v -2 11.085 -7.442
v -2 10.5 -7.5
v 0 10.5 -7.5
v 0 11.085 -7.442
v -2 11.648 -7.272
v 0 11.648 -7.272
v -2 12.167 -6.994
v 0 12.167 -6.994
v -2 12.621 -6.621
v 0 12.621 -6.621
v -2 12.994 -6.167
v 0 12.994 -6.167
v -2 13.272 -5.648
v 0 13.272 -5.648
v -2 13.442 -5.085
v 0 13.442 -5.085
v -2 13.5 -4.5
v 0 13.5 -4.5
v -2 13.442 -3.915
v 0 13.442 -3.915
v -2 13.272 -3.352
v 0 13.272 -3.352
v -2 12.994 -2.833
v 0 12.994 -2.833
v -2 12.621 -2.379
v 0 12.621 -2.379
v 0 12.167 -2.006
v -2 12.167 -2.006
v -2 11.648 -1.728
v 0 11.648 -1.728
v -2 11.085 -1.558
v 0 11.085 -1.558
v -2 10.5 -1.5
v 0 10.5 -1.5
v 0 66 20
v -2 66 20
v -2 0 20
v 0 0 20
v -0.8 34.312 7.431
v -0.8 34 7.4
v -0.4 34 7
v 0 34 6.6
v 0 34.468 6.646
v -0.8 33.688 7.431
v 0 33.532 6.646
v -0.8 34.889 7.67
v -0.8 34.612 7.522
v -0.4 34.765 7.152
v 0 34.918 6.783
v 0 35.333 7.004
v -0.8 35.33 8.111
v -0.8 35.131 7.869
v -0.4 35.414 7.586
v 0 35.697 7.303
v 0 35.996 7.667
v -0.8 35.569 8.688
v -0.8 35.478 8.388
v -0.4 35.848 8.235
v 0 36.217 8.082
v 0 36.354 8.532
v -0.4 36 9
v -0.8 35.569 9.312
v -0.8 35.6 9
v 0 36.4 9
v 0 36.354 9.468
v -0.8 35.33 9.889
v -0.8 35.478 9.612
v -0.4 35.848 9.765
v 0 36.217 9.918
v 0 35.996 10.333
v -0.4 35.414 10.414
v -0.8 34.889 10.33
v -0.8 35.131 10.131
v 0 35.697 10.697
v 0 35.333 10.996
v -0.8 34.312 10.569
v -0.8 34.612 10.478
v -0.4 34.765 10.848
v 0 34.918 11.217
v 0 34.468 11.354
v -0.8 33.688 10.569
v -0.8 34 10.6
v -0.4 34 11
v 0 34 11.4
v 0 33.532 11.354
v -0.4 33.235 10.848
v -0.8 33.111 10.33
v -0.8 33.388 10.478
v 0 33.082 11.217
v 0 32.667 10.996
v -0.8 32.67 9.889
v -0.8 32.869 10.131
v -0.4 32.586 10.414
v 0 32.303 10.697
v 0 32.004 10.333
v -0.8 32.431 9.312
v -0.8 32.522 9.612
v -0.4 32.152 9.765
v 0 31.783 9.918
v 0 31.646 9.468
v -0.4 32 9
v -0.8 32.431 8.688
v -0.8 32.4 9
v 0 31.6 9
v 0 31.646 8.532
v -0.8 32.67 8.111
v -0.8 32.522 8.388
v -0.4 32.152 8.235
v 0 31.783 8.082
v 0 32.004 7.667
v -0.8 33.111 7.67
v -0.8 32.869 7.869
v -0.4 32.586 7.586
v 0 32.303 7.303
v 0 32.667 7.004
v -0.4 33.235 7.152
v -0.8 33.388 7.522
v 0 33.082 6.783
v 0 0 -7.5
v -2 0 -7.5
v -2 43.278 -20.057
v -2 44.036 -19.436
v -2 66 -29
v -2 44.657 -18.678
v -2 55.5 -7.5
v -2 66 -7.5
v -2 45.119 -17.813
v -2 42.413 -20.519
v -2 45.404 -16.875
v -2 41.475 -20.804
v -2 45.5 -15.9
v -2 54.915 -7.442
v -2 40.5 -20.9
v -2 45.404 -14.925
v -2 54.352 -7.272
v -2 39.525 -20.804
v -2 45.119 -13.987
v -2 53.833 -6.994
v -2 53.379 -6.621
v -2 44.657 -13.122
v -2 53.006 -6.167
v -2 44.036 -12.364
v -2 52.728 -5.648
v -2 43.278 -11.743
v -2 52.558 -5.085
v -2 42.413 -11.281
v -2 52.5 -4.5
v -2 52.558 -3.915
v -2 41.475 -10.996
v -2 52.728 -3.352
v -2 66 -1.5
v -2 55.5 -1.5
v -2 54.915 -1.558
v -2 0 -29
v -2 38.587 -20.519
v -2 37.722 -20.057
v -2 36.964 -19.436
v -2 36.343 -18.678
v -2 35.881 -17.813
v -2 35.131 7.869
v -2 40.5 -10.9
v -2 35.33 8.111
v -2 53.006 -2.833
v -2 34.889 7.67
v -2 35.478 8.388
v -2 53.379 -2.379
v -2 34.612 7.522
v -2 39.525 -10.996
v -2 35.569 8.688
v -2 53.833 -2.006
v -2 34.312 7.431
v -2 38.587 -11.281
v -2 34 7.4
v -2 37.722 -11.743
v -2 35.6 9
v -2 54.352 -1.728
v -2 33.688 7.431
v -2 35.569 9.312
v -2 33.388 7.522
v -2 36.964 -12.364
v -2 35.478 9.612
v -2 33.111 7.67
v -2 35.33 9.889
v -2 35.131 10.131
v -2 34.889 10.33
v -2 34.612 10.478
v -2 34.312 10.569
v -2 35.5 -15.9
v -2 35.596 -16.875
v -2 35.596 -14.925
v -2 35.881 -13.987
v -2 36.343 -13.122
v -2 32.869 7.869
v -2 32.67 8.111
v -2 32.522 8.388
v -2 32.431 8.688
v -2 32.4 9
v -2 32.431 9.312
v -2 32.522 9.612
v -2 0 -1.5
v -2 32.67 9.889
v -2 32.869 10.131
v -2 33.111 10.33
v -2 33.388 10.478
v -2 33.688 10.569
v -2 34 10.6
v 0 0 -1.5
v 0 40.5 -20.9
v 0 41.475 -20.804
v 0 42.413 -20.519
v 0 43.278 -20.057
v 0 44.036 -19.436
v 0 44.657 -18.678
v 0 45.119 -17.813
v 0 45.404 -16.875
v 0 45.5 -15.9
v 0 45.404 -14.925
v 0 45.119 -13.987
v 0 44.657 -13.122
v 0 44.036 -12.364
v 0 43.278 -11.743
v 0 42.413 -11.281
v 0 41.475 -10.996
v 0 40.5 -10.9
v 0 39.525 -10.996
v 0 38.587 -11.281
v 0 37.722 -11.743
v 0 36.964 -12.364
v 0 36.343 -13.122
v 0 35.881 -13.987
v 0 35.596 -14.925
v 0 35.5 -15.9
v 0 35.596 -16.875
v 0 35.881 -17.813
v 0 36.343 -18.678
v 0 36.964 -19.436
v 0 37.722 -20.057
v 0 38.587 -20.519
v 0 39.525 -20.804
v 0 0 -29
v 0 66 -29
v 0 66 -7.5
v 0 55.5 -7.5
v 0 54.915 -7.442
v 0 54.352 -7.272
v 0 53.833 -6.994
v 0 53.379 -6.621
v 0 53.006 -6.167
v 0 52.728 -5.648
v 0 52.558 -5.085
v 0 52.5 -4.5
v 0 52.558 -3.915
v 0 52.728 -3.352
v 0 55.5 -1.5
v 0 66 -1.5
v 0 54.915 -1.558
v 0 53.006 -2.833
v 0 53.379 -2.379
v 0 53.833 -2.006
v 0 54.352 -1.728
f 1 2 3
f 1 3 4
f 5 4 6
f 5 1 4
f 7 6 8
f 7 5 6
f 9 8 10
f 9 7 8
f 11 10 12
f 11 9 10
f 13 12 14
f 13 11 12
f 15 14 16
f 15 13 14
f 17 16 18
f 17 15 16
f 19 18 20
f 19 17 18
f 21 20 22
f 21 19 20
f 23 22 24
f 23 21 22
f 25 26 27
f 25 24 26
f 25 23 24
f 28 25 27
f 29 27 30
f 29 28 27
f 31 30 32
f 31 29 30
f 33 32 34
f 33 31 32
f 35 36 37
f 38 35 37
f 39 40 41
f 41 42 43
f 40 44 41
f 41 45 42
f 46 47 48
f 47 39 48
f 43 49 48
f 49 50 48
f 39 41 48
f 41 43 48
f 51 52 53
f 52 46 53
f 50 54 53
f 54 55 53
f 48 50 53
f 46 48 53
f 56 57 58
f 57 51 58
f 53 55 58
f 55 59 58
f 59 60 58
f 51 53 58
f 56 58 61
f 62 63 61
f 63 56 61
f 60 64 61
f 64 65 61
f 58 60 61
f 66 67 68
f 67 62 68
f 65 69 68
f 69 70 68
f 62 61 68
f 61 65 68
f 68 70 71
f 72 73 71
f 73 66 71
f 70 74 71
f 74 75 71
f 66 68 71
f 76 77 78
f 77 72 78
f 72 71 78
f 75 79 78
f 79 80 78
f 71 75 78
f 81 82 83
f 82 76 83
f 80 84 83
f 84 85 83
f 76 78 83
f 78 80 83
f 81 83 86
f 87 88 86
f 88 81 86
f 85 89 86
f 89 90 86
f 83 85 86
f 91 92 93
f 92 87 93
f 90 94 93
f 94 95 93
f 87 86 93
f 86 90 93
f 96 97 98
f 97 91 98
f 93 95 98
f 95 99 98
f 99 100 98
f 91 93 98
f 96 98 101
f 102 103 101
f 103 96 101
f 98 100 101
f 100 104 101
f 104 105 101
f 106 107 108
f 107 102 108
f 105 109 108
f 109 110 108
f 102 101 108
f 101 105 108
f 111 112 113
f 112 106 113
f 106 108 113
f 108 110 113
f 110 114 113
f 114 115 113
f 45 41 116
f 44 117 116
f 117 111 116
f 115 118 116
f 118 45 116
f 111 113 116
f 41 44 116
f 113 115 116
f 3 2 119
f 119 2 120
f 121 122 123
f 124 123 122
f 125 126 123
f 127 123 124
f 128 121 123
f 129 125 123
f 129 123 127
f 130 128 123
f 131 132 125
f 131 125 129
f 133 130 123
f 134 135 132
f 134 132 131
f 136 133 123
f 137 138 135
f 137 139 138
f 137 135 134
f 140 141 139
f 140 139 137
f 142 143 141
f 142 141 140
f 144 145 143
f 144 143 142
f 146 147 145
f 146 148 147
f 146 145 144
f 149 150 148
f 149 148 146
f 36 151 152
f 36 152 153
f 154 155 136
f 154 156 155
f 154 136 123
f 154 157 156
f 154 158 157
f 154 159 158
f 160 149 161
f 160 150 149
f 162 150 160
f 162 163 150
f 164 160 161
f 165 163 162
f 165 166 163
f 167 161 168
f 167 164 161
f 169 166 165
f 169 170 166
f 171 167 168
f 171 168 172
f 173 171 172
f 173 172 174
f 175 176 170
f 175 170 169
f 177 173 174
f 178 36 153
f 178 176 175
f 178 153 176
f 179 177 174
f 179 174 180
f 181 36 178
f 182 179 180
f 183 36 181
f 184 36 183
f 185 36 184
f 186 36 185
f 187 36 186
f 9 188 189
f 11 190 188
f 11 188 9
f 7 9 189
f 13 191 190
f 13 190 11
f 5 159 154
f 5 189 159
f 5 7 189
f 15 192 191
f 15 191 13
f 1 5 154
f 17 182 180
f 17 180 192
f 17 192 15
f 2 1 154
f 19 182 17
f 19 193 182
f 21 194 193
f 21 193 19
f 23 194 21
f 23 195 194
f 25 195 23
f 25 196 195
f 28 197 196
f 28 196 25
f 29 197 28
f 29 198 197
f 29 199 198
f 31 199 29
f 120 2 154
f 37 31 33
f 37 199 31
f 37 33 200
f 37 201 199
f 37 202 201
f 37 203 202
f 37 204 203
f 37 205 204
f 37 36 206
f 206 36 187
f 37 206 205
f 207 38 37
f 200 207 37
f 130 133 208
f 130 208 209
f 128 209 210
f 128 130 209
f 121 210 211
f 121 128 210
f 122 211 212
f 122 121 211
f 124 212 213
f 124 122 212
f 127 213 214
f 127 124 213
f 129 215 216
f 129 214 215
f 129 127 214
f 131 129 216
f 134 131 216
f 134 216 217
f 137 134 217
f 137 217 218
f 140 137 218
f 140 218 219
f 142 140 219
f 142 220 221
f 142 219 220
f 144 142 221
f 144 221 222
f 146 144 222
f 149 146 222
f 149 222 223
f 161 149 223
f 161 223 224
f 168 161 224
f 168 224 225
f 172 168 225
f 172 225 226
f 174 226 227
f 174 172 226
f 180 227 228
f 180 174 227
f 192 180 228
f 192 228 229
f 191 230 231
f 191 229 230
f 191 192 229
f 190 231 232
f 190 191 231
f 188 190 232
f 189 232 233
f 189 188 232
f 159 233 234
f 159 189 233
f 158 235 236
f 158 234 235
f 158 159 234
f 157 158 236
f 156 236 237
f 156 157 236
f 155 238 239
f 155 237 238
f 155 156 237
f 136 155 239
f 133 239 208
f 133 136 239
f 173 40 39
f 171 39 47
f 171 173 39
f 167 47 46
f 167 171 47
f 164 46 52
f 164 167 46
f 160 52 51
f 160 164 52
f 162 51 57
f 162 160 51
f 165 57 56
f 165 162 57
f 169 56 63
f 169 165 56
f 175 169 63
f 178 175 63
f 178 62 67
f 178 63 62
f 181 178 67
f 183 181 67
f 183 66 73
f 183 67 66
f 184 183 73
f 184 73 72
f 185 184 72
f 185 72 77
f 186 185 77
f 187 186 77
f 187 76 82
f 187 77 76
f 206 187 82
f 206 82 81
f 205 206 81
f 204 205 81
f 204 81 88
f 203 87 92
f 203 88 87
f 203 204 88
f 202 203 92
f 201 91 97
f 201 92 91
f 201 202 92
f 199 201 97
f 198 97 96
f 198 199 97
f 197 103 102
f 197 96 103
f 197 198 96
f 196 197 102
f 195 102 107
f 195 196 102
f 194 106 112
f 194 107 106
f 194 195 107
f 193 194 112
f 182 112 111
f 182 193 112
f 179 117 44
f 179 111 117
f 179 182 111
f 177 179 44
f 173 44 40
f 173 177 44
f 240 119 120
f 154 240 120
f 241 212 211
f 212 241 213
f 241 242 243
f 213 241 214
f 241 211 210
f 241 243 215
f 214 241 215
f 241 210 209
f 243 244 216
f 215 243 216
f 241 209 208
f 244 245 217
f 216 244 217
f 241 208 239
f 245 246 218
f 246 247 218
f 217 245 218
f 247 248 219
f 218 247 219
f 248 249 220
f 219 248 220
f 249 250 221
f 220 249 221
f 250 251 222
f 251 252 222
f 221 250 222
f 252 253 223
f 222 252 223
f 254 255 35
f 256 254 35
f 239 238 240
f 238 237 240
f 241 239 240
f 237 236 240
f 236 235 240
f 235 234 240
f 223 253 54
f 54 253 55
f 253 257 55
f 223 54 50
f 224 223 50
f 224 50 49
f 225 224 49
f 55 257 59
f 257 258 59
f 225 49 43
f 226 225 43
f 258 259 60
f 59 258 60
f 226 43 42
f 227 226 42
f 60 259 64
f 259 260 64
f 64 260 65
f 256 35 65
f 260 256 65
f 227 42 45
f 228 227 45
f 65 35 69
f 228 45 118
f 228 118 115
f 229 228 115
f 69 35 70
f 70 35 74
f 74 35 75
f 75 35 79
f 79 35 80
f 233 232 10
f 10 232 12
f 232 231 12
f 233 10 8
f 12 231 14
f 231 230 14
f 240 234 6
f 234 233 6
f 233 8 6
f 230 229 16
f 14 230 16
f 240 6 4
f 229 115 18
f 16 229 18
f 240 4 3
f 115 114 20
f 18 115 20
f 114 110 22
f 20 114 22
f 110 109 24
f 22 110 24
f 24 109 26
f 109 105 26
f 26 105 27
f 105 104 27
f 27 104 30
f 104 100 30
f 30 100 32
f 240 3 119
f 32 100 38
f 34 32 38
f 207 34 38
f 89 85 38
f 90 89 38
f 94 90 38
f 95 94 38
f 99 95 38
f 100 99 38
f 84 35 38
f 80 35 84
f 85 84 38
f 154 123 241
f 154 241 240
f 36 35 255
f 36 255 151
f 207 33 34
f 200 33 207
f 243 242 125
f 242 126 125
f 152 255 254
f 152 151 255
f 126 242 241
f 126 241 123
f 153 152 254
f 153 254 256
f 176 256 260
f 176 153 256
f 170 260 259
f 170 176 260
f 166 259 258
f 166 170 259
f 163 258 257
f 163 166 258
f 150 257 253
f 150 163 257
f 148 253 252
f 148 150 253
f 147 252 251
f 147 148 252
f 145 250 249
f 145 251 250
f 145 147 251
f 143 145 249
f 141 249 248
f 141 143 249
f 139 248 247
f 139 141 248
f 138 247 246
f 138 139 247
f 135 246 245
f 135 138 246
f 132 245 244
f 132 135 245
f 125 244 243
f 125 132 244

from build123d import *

# Parameters (mm, degrees)
CYLINDER003_R          = 1.6
CYLINDER003_DEPTH      = 10
FUSION_PLACEMENT_ANGLE = 90
BOX002_W               = 12
BOX002_H               = 10
BOX002_DEPTH           = 6
BOX001_W               = 12
BOX001_H               = 10
BOX001_DEPTH           = 6
CYLINDER002_R          = 3
CYLINDER002_DEPTH      = 10
CYLINDER001_R          = 5
CYLINDER001_DEPTH      = 10
CYLINDER_R             = 3
CYLINDER_DEPTH         = 10
BOX_W                  = 66
BOX_H                  = 2
BOX_DEPTH              = 49


with BuildPart() as zylinder003:
    # Cylinder003 → Cylinder003 (new body)
    with BuildSketch(Plane.XY.offset(-6)):
        Circle(CYLINDER003_R)
    extrude(amount=CYLINDER003_DEPTH)


with BuildPart() as fusion:
    # Cone003 → Cone003 (revolve)
    with BuildSketch(Plane.XZ):
        Polygon((0, 0), (4, 4), (0, 4), align=None)
    revolve(axis=Axis((0, 0, 0), (0, 0, 1)))

    # Fusion: union Zylinder003
    add(zylinder003.part)


with BuildPart() as fusion_1:
    # Fusion placement: moved
    add(fusion.part.moved(Location((-2.4, 34, 9))).rotate(Axis((-2.4, 34, 9), (0, 1, 0)), FUSION_PLACEMENT_ANGLE))


with BuildPart() as w_rfel002:
    # Box002 → Box002 (new body)
    with BuildSketch(Plane(origin=(4, 67.5, -1.5), x_dir=(0, -1, 0), z_dir=(0, 0, -1))):
        with Locations((6, 5)):
            Rectangle(BOX002_W, BOX002_H)
    extrude(amount=BOX002_DEPTH)


with BuildPart() as w_rfel001:
    # Box001 → Box001 (new body)
    with BuildSketch(Plane(origin=(3, 10.5, -1.5), x_dir=(0, -1, 0), z_dir=(0, 0, -1))):
        with Locations((6, 5)):
            Rectangle(BOX001_W, BOX001_H)
    extrude(amount=BOX001_DEPTH)


with BuildPart() as zylinder002:
    # Cylinder002 → Cylinder002 (new body)
    with BuildSketch(Plane(origin=(-5.5, 55.5, -4.5), x_dir=(0, 0, -1), z_dir=(1, 0, 0))):
        Circle(CYLINDER002_R)
    extrude(amount=CYLINDER002_DEPTH)


with BuildPart() as zylinder001:
    # Cylinder001 → Cylinder001 (new body)
    with BuildSketch(Plane(origin=(-5, 40.5, -15.9), x_dir=(0, 0, -1), z_dir=(1, 0, 0))):
        Circle(CYLINDER001_R)
    extrude(amount=CYLINDER001_DEPTH)


with BuildPart() as zylinder:
    # Cylinder → Cylinder (new body)
    with BuildSketch(Plane(origin=(-5.5, 10.5, -4.5), x_dir=(0, 0, -1), z_dir=(1, 0, 0))):
        Circle(CYLINDER_R)
    extrude(amount=CYLINDER_DEPTH)


with BuildPart() as cut005:
    # Box → Box (new body)
    with BuildSketch(Plane(origin=(0, 66, 20), x_dir=(0, -1, 0), z_dir=(0, 0, -1))):
        with Locations((33, 1)):
            Rectangle(BOX_W, BOX_H)
    extrude(amount=BOX_DEPTH)

    # Cut: cut Zylinder
    add(zylinder.part, mode=Mode.SUBTRACT)

    # Cut001: cut Zylinder001
    add(zylinder001.part, mode=Mode.SUBTRACT)

    # Cut002: cut Zylinder002
    add(zylinder002.part, mode=Mode.SUBTRACT)

    # Cut003: cut Würfel001
    add(w_rfel001.part, mode=Mode.SUBTRACT)

    # Cut004: cut Würfel002
    add(w_rfel002.part, mode=Mode.SUBTRACT)

    # Cut005: cut Fusion
    add(fusion_1.part, mode=Mode.SUBTRACT)


solid = cut005.part
